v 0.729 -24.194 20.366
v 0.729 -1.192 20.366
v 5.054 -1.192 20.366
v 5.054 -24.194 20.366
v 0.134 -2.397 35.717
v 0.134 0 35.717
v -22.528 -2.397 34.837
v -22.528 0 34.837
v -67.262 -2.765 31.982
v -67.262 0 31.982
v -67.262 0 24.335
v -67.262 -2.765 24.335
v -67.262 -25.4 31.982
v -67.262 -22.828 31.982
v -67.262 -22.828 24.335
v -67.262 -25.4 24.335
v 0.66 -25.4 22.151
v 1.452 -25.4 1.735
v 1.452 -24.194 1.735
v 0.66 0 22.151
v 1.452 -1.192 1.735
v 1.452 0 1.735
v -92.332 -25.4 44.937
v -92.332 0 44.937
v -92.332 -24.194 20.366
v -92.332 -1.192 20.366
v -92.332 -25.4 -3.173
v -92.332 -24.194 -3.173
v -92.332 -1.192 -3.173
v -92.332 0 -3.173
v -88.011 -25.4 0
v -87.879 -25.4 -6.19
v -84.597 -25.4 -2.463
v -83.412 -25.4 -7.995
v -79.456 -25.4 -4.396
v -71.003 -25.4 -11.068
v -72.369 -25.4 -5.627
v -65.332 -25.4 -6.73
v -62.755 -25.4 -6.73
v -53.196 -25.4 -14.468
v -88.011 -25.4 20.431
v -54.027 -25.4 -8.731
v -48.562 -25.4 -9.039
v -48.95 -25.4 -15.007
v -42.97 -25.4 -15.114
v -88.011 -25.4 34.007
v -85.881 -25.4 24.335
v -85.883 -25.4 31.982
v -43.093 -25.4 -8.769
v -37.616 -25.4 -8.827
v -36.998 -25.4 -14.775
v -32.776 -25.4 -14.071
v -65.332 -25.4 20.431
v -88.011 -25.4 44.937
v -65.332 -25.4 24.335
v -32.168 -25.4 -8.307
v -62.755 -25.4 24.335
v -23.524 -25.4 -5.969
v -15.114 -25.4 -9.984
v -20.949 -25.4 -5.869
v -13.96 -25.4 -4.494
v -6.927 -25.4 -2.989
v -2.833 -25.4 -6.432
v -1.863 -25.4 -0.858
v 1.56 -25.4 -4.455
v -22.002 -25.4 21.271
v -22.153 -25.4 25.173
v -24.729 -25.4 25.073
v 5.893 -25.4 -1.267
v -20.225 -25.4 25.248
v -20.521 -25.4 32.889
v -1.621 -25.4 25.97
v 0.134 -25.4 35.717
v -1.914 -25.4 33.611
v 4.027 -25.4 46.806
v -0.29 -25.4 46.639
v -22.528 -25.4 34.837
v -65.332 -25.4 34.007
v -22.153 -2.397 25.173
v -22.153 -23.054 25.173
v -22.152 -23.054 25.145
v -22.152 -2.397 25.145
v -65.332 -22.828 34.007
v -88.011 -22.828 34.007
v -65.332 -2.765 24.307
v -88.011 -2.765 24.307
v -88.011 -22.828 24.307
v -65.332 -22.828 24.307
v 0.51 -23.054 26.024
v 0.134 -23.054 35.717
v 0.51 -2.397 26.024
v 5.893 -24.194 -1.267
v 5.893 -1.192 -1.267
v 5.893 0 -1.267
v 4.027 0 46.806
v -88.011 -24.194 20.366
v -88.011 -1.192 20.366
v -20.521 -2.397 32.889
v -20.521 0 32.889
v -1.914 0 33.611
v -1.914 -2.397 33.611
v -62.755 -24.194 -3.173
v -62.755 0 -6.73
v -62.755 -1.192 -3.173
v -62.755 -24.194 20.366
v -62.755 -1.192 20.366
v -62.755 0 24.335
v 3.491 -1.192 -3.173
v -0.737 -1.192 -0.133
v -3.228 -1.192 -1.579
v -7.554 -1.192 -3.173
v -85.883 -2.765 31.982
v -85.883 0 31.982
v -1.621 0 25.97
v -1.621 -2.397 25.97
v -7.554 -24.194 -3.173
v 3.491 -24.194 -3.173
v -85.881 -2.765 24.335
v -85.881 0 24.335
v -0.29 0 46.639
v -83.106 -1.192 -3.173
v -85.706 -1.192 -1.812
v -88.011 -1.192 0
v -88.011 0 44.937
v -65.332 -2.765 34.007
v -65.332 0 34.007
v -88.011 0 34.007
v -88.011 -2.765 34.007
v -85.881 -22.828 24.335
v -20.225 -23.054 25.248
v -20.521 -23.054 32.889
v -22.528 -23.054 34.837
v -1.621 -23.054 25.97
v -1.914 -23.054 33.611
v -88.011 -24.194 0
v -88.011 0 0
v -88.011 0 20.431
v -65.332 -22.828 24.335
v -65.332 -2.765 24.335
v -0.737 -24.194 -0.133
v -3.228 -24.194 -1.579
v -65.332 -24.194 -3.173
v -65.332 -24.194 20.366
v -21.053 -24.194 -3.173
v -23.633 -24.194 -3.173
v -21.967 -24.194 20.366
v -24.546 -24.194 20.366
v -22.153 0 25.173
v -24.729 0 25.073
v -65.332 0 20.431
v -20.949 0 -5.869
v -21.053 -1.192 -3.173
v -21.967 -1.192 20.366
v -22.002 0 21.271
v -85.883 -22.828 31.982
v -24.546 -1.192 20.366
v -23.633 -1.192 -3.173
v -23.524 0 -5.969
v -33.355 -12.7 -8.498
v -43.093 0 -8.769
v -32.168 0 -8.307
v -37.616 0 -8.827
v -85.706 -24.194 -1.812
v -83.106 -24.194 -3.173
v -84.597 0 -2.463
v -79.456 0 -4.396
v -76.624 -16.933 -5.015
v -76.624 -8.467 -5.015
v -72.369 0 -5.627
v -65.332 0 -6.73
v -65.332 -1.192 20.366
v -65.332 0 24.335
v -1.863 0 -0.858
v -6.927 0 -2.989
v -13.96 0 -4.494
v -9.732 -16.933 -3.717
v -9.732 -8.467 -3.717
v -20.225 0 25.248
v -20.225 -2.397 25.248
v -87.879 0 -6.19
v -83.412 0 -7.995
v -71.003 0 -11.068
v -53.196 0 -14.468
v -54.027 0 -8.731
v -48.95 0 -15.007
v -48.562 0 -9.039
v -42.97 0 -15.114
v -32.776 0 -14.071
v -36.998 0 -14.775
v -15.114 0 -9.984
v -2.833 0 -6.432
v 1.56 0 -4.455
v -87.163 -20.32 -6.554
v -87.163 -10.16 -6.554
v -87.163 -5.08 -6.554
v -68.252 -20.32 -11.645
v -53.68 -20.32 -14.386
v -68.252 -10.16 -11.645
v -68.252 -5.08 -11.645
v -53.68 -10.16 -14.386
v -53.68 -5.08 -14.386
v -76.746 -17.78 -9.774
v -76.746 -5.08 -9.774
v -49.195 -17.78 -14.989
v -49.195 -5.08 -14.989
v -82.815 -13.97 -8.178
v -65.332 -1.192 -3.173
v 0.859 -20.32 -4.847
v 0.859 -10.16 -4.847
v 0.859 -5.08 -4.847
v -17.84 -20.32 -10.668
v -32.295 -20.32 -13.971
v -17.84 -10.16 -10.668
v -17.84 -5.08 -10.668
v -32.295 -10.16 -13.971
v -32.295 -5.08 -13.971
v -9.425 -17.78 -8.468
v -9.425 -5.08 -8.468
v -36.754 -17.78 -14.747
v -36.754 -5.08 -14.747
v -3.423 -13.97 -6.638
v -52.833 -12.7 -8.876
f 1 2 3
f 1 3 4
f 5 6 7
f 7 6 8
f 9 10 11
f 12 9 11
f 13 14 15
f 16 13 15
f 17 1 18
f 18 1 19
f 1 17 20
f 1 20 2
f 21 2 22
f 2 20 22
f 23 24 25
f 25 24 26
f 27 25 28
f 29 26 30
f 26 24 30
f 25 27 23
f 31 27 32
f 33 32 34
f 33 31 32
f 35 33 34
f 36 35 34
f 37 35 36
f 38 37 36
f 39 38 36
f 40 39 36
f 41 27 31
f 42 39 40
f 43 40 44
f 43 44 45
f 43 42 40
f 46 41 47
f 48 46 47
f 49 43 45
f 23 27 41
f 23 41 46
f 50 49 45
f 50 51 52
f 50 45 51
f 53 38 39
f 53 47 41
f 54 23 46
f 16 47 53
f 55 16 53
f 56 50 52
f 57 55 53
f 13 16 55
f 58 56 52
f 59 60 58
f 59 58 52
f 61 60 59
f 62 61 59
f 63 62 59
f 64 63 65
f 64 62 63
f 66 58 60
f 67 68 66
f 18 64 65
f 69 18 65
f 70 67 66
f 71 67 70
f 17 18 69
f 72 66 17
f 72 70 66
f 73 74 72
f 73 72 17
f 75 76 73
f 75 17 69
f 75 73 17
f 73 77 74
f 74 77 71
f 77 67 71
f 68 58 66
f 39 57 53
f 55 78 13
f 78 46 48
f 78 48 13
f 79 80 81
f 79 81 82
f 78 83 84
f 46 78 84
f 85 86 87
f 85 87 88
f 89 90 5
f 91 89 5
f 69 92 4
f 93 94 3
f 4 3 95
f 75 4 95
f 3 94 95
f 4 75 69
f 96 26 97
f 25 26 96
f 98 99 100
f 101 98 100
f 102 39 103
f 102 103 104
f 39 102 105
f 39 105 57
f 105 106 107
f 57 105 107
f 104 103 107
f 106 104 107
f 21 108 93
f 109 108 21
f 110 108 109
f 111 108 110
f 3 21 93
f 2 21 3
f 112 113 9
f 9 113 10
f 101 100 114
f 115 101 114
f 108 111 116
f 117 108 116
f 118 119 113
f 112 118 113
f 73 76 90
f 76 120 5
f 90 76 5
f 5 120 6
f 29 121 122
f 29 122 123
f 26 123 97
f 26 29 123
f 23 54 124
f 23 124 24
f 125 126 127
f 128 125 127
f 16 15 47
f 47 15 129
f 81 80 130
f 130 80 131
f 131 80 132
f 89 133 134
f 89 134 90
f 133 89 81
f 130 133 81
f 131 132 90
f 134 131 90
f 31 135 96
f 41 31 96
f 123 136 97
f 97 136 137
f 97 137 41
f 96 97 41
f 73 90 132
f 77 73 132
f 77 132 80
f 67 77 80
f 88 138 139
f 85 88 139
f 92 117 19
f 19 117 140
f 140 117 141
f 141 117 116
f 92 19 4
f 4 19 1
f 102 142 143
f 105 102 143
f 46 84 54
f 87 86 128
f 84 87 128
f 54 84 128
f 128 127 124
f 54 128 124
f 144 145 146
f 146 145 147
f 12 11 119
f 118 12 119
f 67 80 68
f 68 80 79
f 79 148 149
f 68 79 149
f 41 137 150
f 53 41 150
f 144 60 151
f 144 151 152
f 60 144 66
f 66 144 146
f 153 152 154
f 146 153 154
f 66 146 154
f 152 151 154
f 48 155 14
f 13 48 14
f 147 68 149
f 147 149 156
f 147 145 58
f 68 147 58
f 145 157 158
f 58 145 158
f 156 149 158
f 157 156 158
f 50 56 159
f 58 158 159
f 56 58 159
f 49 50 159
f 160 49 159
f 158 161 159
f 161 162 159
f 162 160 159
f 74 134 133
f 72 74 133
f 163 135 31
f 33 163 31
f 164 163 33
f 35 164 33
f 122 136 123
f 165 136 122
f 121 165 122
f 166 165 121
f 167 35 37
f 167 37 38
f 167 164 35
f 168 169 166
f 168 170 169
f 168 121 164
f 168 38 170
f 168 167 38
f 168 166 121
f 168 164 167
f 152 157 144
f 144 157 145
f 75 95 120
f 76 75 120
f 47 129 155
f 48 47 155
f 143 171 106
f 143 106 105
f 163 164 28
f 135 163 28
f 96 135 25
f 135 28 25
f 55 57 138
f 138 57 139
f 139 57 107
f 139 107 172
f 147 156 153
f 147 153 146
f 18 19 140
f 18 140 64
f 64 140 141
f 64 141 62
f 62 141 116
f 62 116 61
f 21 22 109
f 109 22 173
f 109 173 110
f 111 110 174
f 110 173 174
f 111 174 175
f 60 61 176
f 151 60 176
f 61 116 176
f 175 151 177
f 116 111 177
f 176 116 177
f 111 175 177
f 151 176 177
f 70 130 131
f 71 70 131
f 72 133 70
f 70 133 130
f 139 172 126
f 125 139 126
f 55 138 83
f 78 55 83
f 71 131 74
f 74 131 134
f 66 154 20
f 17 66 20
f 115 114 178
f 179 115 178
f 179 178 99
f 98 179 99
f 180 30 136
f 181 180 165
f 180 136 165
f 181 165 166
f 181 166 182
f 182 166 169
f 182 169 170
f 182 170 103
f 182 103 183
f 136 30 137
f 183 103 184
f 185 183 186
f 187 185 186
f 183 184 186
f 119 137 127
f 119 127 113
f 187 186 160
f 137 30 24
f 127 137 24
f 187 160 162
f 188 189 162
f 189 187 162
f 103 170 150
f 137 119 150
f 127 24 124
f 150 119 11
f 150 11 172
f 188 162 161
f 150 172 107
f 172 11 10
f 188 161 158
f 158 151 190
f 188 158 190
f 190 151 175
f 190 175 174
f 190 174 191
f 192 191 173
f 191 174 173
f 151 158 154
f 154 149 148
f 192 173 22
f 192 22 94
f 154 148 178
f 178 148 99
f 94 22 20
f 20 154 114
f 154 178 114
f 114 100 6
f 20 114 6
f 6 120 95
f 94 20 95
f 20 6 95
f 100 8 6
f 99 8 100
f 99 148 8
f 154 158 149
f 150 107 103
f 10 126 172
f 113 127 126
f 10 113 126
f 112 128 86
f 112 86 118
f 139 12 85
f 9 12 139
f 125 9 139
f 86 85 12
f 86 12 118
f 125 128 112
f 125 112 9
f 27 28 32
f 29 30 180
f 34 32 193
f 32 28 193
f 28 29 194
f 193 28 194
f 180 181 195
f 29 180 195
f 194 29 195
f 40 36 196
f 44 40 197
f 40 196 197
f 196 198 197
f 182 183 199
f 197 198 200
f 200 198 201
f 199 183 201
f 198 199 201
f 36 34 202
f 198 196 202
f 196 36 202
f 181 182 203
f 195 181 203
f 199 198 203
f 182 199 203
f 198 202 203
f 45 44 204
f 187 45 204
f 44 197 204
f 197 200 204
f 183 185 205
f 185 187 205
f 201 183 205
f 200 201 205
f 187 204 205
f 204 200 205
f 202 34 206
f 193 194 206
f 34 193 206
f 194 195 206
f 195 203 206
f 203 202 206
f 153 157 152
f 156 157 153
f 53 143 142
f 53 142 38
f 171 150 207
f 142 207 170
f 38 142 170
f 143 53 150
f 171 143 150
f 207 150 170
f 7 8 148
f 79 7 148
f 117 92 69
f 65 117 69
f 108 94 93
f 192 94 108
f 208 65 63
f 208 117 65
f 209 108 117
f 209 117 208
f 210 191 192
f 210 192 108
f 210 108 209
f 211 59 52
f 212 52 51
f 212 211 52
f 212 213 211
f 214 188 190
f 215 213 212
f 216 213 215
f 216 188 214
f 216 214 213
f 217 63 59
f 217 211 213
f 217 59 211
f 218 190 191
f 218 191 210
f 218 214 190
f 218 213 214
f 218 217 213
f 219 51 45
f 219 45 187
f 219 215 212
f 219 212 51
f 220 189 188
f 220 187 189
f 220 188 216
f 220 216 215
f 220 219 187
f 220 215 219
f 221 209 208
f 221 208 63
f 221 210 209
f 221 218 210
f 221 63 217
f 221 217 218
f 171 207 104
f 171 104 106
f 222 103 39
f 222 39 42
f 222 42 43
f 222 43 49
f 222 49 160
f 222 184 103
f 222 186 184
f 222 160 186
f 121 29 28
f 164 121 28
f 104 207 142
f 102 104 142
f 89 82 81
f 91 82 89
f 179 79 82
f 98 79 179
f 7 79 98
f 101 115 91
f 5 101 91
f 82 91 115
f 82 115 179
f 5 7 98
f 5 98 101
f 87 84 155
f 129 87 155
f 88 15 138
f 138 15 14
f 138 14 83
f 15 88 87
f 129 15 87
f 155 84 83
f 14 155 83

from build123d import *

# Parameters (mm, degrees)
F1_DEPTH = 25.4
F2_W     = 23.002351285
F2_H     = 23.5382290557
F3_DEPTH = 200
F4_W     = 22.6789787412
F4_H     = 20.0632547494
F5_DEPTH = 9.7
F6_W     = 22.6789787412
F6_H     = 20.6567810383
F7_DEPTH = 9.7


with BuildPart() as f1:
    # F0 (on Front) → F1 (new body)
    with BuildSketch(Plane.XZ):
        with BuildLine():
            Line((-88.0114324391, 44.9371878058), (-92.332277447, 44.9371878058))
            Line((-92.332277447, 44.9371878058), (-92.332277447, -3.1727263704))
            add(Edge.make_bspline(
                [(-92.332277447, -3.1727263704), (-90.1621250206, -4.8428116353), (-87.3784565002, -6.7092328778), (-81.1715490314, -8.8067426399), (-68.3223344623, -11.7452096222), (-52.7487966745, -14.6124342412), (-48.5107222082, -15.2044240054), (-42.9695285857, -15.1135046035)],
                knots=[0, 0, 0, 0, 0.1061199285, 0.2106615838, 0.3682095287, 0.5326224088, 0.6725216292, 0.6725216292, 0.6725216292, 0.6725216292], degree=3))
            Line((-42.9695285857, -15.1135046035), (-43.0925939554, -8.7688258267))
            add(Edge.make_bspline(
                [(-62.7548545599, -6.7295194604), (-59.4493670767, -7.6350430897), (-52.9059212561, -9.4275910387), (-46.3411198764, -8.9868982298), (-43.0925939554, -8.7688258267)],
                knots=[0, 0, 0, 0, 0.50516006, 1, 1, 1, 1], degree=3))
            Line((-62.7548545599, -6.7295194604), (-65.3324536979, -6.7295194604))
            add(Edge.make_bspline(
                [(-88.0114324391, 0), (-87.0734538531, -0.8836713226), (-84.3852284873, -2.9653247289), (-76.6297771142, -5.4632983452), (-68.5336425498, -5.9339730817), (-65.3324536979, -6.7295194604)],
                knots=[0, 0, 0, 0, 0.2503633507, 0.5945183664, 1, 1, 1, 1], degree=3))
            Line((-88.0114324391, 0), (-88.0114324391, 20.4308070242))
            Line((-88.0114324391, 20.4308070242), (-88.0114324391, 24.3352483958))
            Line((-88.0114324391, 24.3352483958), (-88.0114324391, 34.0071152896))
            Line((-88.0114324391, 34.0071152896), (-88.0114324391, 44.9371878058))
        make_face()
        with BuildLine():
            Line((-43.0925939554, -8.7688258267), (-42.9695285857, -15.1135046035))
            add(Edge.make_bspline(
                [(5.8930433958, -1.2674864281), (3.7892869814, -3.02047111), (1.0800895919, -4.9934354255), (-5.0408105659, -7.3300630778), (-17.7664104464, -10.764595205), (-33.2170470606, -14.233584173), (-37.4289771792, -14.989475527), (-42.9695285857, -15.1135046035)],
                knots=[0, 0, 0, 0, 0.1061199285, 0.2106615838, 0.3682095287, 0.5326224088, 0.6725216292, 0.6725216292, 0.6725216292, 0.6725216292], degree=3))
            Line((5.8930433958, -1.2674864281), (4.0274051514, 46.8062406583))
            Line((4.0274051514, 46.8062406583), (-0.2901898236, 46.6386840573))
            Line((-0.2901898236, 46.6386840573), (0.1336637968, 35.7168328718))
            Line((0.1336637968, 35.7168328718), (0.5087258829, 26.0522409176))
            Line((0.5087258829, 26.0522409176), (0.6601349068, 22.1507363704))
            Line((0.6601349068, 22.1507363704), (1.4524143278, 1.7352968948))
            add(Edge.make_bspline(
                [(1.4524143278, 1.7352968948), (0.5494088604, 0.8159166906), (-2.0560707486, -1.3684167382), (-9.7088205806, -4.1652574911), (-17.7806132945, -4.9495354876), (-20.9485440647, -5.8686213059)],
                knots=[0, 0, 0, 0, 0.2503633507, 0.5945183664, 1, 1, 1, 1], degree=3))
            Line((-20.9485440647, -5.8686213059), (-23.5242043963, -5.9685771594))
            add(Edge.make_bspline(
                [(-23.5242043963, -5.9685771594), (-26.792090576, -7.001602068), (-33.2611019617, -9.0465477999), (-39.8380549387, -8.8607607028), (-43.0925939554, -8.7688258267)],
                knots=[0, 0, 0, 0, 0.50516006, 1, 1, 1, 1], degree=3))
        make_face()
        Polygon((-24.7288546219, 25.0728245453), (-23.5242043963, -5.9685771594), (-20.9485440647, -5.8686213059), (-22.0017852664, 21.2712758516), (0.6601349068, 22.1507363704), (0.5087258829, 26.0522409176), (0.1336637968, 35.7168328718), (-22.5282563764, 34.837372353), (-22.1531942903, 25.1727803987), align=None)
        Polygon((-20.2248709389, 25.2476144923), (-20.5214146142, 32.8889456861), (-1.9144672145, 33.6110414083), (-1.6205286616, 25.9696091153), align=None, mode=Mode.SUBTRACT)
        Polygon((-65.3324536979, 34.0071152896), (-88.0114324391, 34.0071152896), (-88.0114324391, 24.3352483958), (-88.0114324391, 20.4308070242), (-65.3324536979, 20.4308070242), (-65.3324536979, -6.7295194604), (-62.7548545599, -6.7295194604), (-62.7548545599, 24.3352483958), (-65.3324536979, 24.3352483958), align=None)
        Polygon((-85.8805751163, 24.3352483958), (-85.8831821996, 31.9823315367), (-67.2622285783, 31.9823315367), (-67.2622285783, 24.3352483958), align=None, mode=Mode.SUBTRACT)
    extrude(amount=F1_DEPTH)

    # F2 (on face) → F3 (cut)
    with BuildSketch(Plane(origin=(-92.332277447, 0, 0), x_dir=(0, -1, 0), z_dir=(-1, 0, 0))):
        with Locations((12.6931375707, 8.5963881575)):
            Rectangle(F2_W, F2_H)
    extrude(amount=-F3_DEPTH, mode=Mode.SUBTRACT)

    # F4 (on face) → F5 (cut)
    with BuildSketch(Plane.XY.offset(34.0071152896)):
        with Locations((-76.6719430685, -12.7963220002)):
            Rectangle(F4_W, F4_H)
    extrude(amount=-F5_DEPTH, mode=Mode.SUBTRACT)

    # F6 (on face) → F7 (cut)
    with BuildSketch(Plane(origin=(-1.3838082935, 0, 35.6579430345), x_dir=(0.9992478247, 0, 0.038778665), z_dir=(-0.038778665, 0, 0.9992478247))):
        with Locations((-9.820875016, -12.7256970154)):
            Rectangle(F6_W, F6_H)
    extrude(amount=-F7_DEPTH, mode=Mode.SUBTRACT)


solid = f1.part
